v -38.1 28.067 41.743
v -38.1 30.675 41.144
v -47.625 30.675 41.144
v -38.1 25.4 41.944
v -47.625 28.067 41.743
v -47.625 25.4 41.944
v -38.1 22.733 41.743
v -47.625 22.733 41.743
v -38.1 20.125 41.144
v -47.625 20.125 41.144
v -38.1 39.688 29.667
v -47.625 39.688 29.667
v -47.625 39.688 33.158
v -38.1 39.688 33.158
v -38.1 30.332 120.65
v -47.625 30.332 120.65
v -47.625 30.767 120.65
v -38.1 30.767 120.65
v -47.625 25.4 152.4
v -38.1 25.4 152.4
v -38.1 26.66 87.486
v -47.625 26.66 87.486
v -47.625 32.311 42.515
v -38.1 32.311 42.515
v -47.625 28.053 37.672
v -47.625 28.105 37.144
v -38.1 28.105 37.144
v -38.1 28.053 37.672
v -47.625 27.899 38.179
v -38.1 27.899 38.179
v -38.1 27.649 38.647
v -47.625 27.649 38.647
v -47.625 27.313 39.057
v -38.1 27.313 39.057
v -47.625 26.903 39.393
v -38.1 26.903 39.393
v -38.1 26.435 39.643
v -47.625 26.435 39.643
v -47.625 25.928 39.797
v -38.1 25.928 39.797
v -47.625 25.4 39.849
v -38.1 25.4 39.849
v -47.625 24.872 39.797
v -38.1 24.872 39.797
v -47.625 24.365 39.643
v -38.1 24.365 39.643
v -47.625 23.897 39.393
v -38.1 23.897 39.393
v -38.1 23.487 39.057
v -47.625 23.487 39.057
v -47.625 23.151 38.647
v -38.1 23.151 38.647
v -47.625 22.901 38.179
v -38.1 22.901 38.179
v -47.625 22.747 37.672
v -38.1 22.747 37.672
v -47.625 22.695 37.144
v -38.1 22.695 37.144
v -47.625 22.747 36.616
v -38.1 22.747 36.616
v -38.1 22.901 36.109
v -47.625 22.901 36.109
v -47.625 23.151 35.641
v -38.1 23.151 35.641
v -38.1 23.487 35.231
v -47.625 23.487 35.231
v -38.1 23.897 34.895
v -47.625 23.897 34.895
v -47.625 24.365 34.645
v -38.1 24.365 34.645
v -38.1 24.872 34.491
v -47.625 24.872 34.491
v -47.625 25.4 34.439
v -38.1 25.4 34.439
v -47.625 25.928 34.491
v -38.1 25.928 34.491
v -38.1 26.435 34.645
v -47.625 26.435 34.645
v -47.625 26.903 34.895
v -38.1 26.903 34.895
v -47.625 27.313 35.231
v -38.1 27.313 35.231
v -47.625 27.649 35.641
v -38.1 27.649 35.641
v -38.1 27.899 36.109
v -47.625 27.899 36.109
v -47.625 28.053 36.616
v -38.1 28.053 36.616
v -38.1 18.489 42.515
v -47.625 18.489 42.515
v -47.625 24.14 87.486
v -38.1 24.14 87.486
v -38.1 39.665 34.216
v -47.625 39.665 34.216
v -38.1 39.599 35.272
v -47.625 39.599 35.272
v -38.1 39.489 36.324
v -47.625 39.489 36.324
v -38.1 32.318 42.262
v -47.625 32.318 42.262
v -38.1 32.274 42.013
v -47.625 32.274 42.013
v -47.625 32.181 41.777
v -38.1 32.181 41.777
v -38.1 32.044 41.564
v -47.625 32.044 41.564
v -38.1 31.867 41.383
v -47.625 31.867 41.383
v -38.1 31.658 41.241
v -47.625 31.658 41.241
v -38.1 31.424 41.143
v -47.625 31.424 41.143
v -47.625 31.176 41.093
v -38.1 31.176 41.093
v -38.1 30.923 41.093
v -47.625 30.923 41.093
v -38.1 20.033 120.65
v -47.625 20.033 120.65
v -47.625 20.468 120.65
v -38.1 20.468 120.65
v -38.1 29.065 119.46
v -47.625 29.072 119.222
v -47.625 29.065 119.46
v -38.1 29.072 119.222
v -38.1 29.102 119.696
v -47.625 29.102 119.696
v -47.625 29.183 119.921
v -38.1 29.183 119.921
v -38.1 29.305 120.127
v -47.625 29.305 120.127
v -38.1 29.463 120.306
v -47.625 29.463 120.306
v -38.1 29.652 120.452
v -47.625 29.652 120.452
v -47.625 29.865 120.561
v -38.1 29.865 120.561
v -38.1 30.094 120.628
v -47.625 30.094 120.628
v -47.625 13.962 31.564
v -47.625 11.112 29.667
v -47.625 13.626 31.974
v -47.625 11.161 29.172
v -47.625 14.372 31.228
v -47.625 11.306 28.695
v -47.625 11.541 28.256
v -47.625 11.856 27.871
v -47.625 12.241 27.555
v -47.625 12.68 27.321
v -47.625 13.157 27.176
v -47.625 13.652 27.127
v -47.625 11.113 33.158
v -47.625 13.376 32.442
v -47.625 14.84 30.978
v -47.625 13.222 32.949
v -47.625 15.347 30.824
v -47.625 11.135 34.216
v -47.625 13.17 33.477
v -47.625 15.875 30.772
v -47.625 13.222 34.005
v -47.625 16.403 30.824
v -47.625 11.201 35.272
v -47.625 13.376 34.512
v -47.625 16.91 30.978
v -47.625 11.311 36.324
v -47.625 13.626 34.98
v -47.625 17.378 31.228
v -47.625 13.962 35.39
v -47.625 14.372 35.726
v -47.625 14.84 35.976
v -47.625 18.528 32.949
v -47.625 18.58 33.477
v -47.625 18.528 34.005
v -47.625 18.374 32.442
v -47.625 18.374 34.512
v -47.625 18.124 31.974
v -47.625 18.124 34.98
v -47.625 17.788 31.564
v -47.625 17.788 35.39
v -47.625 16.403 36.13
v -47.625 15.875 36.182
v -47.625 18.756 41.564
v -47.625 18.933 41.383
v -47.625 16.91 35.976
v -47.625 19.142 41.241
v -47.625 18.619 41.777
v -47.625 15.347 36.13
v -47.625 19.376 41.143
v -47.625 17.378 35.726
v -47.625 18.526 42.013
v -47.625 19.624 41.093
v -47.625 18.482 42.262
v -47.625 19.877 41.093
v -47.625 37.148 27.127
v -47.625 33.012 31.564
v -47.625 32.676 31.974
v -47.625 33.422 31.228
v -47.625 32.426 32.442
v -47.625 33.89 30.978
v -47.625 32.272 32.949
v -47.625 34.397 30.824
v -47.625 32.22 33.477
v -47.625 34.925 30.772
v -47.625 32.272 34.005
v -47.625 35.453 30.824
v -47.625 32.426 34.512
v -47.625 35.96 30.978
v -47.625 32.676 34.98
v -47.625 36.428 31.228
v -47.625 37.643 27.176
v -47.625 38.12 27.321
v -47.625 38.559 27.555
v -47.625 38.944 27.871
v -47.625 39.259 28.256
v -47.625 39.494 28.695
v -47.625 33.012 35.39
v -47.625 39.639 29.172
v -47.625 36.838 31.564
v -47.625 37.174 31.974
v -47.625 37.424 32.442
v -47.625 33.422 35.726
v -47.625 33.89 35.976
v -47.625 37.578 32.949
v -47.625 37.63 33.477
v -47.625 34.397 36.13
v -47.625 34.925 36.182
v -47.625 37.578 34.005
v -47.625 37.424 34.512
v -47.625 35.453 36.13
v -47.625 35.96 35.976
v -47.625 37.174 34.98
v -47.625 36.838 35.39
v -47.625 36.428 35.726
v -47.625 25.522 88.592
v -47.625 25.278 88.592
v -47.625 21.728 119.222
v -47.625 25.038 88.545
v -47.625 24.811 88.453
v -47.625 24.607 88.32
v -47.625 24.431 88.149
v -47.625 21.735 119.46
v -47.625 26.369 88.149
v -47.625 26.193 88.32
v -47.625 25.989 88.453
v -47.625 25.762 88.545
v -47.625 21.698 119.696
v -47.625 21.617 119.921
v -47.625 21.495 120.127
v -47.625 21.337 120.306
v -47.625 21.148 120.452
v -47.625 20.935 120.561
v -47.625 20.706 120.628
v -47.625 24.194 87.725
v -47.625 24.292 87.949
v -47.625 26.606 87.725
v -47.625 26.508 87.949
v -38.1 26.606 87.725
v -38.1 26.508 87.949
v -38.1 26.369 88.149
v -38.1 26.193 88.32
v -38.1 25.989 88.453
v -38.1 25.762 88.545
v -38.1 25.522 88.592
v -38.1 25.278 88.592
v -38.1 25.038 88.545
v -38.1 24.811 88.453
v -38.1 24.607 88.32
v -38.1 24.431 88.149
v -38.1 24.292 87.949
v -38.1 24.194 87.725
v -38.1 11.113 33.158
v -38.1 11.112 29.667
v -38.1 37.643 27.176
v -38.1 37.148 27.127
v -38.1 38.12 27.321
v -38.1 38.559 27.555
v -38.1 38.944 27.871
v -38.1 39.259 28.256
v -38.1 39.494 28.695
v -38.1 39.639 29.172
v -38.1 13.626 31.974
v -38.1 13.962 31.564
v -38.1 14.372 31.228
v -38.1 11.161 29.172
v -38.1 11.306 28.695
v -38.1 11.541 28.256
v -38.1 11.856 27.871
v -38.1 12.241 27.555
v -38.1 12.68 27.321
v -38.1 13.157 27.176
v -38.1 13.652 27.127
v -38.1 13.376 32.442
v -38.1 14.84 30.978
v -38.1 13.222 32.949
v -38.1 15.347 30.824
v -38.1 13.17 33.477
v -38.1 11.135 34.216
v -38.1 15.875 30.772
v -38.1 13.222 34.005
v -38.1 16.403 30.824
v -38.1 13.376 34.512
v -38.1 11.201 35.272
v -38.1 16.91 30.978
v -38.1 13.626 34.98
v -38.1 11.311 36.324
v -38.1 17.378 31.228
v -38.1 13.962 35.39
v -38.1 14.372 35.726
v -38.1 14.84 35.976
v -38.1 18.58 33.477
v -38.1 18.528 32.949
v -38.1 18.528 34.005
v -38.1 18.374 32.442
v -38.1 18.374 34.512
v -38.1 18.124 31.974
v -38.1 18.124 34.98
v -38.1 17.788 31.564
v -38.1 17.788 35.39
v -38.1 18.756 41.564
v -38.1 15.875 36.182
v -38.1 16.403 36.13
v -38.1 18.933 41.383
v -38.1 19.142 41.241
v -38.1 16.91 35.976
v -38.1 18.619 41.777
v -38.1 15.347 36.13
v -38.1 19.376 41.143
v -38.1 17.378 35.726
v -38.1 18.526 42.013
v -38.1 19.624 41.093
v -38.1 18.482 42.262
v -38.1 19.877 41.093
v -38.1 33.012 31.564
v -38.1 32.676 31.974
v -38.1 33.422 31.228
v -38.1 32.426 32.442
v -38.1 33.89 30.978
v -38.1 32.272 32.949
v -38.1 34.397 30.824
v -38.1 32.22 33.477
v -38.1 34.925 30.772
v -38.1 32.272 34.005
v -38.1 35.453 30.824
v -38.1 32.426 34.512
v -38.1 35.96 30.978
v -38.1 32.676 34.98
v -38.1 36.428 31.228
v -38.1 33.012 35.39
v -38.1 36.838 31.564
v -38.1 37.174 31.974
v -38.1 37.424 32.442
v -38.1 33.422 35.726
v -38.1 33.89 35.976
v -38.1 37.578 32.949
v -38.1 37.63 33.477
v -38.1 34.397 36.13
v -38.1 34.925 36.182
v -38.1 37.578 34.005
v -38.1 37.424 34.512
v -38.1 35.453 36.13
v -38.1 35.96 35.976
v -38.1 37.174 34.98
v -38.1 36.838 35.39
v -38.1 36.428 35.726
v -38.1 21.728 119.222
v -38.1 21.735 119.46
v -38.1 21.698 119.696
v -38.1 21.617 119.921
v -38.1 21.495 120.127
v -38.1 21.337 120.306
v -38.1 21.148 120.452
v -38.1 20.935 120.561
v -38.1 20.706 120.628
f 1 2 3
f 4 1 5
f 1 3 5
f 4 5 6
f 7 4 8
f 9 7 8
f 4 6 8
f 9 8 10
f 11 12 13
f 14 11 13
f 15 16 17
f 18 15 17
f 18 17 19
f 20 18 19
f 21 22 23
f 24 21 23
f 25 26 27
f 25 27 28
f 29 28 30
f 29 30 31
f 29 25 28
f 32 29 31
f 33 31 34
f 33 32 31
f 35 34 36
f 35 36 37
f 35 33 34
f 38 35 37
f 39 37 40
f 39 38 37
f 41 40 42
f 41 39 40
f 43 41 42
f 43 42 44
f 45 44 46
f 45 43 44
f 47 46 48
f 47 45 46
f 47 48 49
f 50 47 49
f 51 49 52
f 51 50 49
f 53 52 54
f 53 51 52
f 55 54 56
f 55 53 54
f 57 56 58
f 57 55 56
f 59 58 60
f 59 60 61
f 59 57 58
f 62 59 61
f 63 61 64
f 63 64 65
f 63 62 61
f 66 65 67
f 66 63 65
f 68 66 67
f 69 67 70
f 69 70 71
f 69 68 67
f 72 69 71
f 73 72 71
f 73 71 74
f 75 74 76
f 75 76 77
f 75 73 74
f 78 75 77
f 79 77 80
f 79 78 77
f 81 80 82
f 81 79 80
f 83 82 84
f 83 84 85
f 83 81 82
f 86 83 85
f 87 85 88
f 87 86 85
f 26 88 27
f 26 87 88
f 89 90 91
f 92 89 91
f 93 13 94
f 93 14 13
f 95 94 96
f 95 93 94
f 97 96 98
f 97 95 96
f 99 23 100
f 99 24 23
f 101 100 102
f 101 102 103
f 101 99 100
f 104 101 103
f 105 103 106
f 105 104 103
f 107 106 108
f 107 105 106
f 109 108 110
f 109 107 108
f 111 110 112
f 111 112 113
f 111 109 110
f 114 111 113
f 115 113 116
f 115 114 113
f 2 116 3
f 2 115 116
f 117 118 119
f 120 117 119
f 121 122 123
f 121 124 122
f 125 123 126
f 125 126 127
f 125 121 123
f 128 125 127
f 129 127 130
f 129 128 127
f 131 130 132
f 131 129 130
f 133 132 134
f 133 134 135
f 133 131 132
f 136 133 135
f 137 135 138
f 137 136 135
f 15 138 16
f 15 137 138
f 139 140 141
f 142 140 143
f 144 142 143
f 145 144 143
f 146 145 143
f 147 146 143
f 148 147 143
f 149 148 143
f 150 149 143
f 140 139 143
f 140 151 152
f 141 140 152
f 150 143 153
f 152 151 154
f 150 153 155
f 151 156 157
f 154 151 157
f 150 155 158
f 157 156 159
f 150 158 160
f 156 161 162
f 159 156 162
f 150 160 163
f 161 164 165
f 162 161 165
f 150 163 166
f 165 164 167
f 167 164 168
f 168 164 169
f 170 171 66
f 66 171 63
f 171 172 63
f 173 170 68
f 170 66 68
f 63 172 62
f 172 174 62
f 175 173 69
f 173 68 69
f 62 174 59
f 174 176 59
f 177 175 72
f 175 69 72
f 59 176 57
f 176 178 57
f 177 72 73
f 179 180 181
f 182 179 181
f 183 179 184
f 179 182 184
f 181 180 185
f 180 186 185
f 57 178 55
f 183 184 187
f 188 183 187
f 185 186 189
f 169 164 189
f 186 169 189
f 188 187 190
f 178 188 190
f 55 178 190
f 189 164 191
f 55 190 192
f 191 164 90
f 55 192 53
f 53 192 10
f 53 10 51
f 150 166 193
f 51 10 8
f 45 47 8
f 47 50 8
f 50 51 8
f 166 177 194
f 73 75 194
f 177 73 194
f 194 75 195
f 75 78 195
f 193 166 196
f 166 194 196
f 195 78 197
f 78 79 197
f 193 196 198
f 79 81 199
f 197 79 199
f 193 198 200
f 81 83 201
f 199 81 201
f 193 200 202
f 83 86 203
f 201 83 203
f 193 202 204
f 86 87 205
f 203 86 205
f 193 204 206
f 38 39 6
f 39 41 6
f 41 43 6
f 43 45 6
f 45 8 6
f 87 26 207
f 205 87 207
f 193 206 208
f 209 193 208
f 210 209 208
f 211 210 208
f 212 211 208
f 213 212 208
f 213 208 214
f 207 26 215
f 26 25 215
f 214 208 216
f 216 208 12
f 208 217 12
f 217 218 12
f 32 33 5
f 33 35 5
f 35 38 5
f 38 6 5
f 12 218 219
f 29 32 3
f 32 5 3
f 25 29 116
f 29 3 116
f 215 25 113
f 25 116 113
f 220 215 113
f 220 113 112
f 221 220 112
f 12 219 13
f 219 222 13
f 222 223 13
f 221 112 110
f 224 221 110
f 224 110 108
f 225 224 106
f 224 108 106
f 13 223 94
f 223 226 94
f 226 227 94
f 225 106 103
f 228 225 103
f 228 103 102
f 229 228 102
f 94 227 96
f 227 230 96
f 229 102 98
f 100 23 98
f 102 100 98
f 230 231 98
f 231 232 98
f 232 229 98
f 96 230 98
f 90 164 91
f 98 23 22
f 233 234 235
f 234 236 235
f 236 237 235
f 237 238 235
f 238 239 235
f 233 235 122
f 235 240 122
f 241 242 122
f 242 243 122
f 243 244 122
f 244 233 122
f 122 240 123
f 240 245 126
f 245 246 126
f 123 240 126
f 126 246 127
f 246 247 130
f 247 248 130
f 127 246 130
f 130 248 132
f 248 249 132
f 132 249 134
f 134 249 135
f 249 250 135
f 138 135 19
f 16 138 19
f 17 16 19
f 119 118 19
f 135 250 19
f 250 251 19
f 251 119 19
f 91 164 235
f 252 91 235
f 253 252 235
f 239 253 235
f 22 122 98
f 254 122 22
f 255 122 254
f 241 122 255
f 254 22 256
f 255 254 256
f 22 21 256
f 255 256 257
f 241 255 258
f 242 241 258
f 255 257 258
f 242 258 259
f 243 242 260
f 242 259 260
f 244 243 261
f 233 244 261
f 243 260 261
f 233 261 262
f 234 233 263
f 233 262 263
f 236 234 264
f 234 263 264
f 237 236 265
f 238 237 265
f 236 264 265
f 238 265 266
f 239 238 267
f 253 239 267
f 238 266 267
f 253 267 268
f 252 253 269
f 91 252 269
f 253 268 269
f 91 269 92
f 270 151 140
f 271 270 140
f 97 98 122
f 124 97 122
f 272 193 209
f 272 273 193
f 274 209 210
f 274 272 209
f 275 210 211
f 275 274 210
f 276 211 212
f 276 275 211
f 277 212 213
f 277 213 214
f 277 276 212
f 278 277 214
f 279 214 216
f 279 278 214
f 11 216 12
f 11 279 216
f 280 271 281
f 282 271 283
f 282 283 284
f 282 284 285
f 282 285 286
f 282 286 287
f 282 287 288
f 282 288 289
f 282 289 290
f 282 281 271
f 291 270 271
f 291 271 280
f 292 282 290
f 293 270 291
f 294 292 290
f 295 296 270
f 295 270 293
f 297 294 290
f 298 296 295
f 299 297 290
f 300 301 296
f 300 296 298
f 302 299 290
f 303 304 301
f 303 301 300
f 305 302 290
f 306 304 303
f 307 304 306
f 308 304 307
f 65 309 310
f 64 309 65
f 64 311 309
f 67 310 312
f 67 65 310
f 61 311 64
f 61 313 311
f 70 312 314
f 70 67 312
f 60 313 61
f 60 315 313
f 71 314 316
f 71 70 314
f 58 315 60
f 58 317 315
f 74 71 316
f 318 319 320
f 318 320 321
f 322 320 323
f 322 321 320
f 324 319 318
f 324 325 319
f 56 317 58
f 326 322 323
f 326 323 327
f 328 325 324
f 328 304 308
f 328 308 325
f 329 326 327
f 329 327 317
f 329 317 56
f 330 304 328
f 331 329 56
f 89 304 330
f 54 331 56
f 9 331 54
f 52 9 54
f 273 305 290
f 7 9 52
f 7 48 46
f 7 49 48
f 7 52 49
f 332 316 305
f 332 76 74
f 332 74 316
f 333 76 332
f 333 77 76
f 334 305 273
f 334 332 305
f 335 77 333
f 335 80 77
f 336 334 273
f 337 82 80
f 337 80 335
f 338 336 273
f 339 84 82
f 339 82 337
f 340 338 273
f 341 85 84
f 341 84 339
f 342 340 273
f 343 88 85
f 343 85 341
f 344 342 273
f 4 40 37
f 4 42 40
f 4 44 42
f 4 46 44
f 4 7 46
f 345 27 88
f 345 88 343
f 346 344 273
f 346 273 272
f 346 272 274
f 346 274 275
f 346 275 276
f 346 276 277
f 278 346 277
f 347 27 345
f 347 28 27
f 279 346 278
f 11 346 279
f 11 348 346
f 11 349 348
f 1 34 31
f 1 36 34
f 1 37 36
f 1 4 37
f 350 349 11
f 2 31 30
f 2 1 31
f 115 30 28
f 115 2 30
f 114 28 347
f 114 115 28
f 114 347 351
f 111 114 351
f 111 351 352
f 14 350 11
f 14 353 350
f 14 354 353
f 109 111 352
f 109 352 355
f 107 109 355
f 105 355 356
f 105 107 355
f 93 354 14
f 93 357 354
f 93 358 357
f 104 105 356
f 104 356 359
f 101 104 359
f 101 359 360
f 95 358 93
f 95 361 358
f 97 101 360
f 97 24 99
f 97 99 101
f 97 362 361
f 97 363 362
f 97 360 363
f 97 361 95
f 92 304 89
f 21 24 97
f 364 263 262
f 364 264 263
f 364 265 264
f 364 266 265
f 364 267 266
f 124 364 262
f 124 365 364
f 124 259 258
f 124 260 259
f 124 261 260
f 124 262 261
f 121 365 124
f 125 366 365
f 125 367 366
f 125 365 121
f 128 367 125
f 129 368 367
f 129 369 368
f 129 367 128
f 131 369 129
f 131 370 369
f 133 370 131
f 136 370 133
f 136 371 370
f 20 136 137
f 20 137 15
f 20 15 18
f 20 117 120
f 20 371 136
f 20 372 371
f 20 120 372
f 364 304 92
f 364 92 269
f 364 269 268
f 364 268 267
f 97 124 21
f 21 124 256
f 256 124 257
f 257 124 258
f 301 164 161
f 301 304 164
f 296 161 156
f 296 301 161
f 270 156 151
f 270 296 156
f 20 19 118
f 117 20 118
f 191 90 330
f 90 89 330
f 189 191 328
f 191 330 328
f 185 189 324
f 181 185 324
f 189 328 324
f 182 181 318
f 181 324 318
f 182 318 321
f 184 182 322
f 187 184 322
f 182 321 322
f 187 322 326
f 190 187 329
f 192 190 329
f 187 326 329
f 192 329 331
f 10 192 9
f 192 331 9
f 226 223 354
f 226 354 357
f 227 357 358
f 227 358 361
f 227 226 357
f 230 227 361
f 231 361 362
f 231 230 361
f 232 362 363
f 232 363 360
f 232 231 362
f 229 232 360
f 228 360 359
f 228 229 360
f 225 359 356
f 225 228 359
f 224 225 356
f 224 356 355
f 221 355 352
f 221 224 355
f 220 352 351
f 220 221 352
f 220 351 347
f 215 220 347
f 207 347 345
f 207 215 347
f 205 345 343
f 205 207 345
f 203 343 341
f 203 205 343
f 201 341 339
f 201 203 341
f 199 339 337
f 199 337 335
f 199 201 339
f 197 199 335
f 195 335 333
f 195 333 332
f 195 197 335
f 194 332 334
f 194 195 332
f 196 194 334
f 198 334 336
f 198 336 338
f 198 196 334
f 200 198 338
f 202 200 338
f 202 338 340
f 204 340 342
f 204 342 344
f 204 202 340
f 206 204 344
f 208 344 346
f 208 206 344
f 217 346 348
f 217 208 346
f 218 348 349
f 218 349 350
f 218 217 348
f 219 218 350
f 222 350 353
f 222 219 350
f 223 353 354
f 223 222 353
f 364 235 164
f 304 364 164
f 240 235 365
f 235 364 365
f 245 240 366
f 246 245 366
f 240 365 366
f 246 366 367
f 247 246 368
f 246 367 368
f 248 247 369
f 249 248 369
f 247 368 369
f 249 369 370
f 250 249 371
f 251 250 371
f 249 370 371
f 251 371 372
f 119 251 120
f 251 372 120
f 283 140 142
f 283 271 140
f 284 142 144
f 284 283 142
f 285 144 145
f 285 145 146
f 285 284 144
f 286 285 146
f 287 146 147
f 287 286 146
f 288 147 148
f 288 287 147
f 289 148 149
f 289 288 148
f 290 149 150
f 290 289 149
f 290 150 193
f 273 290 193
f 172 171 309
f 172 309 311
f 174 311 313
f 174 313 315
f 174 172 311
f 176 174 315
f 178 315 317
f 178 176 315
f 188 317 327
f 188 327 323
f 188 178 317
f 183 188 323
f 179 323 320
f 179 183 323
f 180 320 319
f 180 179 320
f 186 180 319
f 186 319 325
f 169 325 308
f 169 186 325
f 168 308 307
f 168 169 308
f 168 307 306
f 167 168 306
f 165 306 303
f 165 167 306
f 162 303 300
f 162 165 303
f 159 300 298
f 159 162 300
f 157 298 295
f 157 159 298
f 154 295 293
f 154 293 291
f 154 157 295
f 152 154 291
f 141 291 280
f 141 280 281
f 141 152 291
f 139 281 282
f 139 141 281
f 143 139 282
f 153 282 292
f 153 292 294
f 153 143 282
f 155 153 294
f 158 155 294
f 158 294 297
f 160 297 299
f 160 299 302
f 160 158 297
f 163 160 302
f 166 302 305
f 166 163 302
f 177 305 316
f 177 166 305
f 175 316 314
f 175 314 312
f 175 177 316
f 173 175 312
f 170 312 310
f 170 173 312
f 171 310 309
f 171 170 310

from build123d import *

# Parameters (mm, degrees)
STOCK_BUMBLE_START            = -47.625
STOCK_BUMBLE_BYTE_1_OUTLINE_R = 2.7051
STOCK_BUMBLE_BYTE_1_DEPTH     = 9.525
FILLET1_R                     = 2.54
FILLET2_R                     = 1.27
FILLET3_R                     = 1.27
FILLET4_R                     = 25.4


# Read off the part's stored shape, not the designer's step: Stock-Bumble Byte-1
with BuildPart() as part:
    # Stock-Bumble Byte-1 outline → Stock-Bumble Byte-1 (new body)
    with BuildSketch(Plane.YZ.offset(STOCK_BUMBLE_START)):
        Polygon((21.9075, 120.65), (11.1125, 34.7472), (11.1125, 27.1272), (39.6875, 27.1272), (39.6875, 34.7472), (28.8925, 120.65), (30.766729518, 120.65), (25.4, 152.4), (20.033270482, 120.65), align=None)
        with Locations((15.875, 33.4772)):
            Circle(STOCK_BUMBLE_BYTE_1_OUTLINE_R, mode=Mode.SUBTRACT)
        with Locations((25.4, 37.143795847)):
            Circle(STOCK_BUMBLE_BYTE_1_OUTLINE_R, mode=Mode.SUBTRACT)
        with Locations((34.925, 33.4772)):
            Circle(STOCK_BUMBLE_BYTE_1_OUTLINE_R, mode=Mode.SUBTRACT)
        with BuildLine():
            ThreePointArc((32.573016025, 40.433269228), (25.4, 41.944395847), (18.226983975, 40.433269228))
            Line((18.226983975, 40.433269228), (25.4, 97.513599106))
            Line((25.4, 97.513599106), (32.573016025, 40.433269228))
        make_face(mode=Mode.SUBTRACT)
    extrude(amount=STOCK_BUMBLE_BYTE_1_DEPTH)

    # Fillet1
    fillet1_edges = [part.edges().sort_by_distance(p)[0] for p in [
        (-42.8625, 11.1125, 27.1272),
        (-42.8625, 39.6875, 27.1272),
    ]]
    fillet(fillet1_edges, radius=FILLET1_R)

    # Fillet2
    fillet2_edges = [part.edges().sort_by_distance(p)[0] for p in [
        (-42.8625, 18.226983975, 40.433269228),
        (-42.8625, 32.573016025, 40.433269228),
        (-42.8625, 25.4, 97.513599106),
    ]]
    fillet(fillet2_edges, radius=FILLET2_R)

    # Fillet3
    fillet3_edges = [part.edges().sort_by_distance(p)[0] for p in [
        (-42.8625, 28.8925, 120.65),
        (-42.8625, 21.9075, 120.65),
    ]]
    fillet(fillet3_edges, radius=FILLET3_R)

    # Fillet4
    fillet4_edges = [part.edges().sort_by_distance(p)[0] for p in [
        (-42.8625, 11.1125, 34.7472),
        (-42.8625, 39.6875, 34.7472),
    ]]
    fillet(fillet4_edges, radius=FILLET4_R)


solid = part.part
